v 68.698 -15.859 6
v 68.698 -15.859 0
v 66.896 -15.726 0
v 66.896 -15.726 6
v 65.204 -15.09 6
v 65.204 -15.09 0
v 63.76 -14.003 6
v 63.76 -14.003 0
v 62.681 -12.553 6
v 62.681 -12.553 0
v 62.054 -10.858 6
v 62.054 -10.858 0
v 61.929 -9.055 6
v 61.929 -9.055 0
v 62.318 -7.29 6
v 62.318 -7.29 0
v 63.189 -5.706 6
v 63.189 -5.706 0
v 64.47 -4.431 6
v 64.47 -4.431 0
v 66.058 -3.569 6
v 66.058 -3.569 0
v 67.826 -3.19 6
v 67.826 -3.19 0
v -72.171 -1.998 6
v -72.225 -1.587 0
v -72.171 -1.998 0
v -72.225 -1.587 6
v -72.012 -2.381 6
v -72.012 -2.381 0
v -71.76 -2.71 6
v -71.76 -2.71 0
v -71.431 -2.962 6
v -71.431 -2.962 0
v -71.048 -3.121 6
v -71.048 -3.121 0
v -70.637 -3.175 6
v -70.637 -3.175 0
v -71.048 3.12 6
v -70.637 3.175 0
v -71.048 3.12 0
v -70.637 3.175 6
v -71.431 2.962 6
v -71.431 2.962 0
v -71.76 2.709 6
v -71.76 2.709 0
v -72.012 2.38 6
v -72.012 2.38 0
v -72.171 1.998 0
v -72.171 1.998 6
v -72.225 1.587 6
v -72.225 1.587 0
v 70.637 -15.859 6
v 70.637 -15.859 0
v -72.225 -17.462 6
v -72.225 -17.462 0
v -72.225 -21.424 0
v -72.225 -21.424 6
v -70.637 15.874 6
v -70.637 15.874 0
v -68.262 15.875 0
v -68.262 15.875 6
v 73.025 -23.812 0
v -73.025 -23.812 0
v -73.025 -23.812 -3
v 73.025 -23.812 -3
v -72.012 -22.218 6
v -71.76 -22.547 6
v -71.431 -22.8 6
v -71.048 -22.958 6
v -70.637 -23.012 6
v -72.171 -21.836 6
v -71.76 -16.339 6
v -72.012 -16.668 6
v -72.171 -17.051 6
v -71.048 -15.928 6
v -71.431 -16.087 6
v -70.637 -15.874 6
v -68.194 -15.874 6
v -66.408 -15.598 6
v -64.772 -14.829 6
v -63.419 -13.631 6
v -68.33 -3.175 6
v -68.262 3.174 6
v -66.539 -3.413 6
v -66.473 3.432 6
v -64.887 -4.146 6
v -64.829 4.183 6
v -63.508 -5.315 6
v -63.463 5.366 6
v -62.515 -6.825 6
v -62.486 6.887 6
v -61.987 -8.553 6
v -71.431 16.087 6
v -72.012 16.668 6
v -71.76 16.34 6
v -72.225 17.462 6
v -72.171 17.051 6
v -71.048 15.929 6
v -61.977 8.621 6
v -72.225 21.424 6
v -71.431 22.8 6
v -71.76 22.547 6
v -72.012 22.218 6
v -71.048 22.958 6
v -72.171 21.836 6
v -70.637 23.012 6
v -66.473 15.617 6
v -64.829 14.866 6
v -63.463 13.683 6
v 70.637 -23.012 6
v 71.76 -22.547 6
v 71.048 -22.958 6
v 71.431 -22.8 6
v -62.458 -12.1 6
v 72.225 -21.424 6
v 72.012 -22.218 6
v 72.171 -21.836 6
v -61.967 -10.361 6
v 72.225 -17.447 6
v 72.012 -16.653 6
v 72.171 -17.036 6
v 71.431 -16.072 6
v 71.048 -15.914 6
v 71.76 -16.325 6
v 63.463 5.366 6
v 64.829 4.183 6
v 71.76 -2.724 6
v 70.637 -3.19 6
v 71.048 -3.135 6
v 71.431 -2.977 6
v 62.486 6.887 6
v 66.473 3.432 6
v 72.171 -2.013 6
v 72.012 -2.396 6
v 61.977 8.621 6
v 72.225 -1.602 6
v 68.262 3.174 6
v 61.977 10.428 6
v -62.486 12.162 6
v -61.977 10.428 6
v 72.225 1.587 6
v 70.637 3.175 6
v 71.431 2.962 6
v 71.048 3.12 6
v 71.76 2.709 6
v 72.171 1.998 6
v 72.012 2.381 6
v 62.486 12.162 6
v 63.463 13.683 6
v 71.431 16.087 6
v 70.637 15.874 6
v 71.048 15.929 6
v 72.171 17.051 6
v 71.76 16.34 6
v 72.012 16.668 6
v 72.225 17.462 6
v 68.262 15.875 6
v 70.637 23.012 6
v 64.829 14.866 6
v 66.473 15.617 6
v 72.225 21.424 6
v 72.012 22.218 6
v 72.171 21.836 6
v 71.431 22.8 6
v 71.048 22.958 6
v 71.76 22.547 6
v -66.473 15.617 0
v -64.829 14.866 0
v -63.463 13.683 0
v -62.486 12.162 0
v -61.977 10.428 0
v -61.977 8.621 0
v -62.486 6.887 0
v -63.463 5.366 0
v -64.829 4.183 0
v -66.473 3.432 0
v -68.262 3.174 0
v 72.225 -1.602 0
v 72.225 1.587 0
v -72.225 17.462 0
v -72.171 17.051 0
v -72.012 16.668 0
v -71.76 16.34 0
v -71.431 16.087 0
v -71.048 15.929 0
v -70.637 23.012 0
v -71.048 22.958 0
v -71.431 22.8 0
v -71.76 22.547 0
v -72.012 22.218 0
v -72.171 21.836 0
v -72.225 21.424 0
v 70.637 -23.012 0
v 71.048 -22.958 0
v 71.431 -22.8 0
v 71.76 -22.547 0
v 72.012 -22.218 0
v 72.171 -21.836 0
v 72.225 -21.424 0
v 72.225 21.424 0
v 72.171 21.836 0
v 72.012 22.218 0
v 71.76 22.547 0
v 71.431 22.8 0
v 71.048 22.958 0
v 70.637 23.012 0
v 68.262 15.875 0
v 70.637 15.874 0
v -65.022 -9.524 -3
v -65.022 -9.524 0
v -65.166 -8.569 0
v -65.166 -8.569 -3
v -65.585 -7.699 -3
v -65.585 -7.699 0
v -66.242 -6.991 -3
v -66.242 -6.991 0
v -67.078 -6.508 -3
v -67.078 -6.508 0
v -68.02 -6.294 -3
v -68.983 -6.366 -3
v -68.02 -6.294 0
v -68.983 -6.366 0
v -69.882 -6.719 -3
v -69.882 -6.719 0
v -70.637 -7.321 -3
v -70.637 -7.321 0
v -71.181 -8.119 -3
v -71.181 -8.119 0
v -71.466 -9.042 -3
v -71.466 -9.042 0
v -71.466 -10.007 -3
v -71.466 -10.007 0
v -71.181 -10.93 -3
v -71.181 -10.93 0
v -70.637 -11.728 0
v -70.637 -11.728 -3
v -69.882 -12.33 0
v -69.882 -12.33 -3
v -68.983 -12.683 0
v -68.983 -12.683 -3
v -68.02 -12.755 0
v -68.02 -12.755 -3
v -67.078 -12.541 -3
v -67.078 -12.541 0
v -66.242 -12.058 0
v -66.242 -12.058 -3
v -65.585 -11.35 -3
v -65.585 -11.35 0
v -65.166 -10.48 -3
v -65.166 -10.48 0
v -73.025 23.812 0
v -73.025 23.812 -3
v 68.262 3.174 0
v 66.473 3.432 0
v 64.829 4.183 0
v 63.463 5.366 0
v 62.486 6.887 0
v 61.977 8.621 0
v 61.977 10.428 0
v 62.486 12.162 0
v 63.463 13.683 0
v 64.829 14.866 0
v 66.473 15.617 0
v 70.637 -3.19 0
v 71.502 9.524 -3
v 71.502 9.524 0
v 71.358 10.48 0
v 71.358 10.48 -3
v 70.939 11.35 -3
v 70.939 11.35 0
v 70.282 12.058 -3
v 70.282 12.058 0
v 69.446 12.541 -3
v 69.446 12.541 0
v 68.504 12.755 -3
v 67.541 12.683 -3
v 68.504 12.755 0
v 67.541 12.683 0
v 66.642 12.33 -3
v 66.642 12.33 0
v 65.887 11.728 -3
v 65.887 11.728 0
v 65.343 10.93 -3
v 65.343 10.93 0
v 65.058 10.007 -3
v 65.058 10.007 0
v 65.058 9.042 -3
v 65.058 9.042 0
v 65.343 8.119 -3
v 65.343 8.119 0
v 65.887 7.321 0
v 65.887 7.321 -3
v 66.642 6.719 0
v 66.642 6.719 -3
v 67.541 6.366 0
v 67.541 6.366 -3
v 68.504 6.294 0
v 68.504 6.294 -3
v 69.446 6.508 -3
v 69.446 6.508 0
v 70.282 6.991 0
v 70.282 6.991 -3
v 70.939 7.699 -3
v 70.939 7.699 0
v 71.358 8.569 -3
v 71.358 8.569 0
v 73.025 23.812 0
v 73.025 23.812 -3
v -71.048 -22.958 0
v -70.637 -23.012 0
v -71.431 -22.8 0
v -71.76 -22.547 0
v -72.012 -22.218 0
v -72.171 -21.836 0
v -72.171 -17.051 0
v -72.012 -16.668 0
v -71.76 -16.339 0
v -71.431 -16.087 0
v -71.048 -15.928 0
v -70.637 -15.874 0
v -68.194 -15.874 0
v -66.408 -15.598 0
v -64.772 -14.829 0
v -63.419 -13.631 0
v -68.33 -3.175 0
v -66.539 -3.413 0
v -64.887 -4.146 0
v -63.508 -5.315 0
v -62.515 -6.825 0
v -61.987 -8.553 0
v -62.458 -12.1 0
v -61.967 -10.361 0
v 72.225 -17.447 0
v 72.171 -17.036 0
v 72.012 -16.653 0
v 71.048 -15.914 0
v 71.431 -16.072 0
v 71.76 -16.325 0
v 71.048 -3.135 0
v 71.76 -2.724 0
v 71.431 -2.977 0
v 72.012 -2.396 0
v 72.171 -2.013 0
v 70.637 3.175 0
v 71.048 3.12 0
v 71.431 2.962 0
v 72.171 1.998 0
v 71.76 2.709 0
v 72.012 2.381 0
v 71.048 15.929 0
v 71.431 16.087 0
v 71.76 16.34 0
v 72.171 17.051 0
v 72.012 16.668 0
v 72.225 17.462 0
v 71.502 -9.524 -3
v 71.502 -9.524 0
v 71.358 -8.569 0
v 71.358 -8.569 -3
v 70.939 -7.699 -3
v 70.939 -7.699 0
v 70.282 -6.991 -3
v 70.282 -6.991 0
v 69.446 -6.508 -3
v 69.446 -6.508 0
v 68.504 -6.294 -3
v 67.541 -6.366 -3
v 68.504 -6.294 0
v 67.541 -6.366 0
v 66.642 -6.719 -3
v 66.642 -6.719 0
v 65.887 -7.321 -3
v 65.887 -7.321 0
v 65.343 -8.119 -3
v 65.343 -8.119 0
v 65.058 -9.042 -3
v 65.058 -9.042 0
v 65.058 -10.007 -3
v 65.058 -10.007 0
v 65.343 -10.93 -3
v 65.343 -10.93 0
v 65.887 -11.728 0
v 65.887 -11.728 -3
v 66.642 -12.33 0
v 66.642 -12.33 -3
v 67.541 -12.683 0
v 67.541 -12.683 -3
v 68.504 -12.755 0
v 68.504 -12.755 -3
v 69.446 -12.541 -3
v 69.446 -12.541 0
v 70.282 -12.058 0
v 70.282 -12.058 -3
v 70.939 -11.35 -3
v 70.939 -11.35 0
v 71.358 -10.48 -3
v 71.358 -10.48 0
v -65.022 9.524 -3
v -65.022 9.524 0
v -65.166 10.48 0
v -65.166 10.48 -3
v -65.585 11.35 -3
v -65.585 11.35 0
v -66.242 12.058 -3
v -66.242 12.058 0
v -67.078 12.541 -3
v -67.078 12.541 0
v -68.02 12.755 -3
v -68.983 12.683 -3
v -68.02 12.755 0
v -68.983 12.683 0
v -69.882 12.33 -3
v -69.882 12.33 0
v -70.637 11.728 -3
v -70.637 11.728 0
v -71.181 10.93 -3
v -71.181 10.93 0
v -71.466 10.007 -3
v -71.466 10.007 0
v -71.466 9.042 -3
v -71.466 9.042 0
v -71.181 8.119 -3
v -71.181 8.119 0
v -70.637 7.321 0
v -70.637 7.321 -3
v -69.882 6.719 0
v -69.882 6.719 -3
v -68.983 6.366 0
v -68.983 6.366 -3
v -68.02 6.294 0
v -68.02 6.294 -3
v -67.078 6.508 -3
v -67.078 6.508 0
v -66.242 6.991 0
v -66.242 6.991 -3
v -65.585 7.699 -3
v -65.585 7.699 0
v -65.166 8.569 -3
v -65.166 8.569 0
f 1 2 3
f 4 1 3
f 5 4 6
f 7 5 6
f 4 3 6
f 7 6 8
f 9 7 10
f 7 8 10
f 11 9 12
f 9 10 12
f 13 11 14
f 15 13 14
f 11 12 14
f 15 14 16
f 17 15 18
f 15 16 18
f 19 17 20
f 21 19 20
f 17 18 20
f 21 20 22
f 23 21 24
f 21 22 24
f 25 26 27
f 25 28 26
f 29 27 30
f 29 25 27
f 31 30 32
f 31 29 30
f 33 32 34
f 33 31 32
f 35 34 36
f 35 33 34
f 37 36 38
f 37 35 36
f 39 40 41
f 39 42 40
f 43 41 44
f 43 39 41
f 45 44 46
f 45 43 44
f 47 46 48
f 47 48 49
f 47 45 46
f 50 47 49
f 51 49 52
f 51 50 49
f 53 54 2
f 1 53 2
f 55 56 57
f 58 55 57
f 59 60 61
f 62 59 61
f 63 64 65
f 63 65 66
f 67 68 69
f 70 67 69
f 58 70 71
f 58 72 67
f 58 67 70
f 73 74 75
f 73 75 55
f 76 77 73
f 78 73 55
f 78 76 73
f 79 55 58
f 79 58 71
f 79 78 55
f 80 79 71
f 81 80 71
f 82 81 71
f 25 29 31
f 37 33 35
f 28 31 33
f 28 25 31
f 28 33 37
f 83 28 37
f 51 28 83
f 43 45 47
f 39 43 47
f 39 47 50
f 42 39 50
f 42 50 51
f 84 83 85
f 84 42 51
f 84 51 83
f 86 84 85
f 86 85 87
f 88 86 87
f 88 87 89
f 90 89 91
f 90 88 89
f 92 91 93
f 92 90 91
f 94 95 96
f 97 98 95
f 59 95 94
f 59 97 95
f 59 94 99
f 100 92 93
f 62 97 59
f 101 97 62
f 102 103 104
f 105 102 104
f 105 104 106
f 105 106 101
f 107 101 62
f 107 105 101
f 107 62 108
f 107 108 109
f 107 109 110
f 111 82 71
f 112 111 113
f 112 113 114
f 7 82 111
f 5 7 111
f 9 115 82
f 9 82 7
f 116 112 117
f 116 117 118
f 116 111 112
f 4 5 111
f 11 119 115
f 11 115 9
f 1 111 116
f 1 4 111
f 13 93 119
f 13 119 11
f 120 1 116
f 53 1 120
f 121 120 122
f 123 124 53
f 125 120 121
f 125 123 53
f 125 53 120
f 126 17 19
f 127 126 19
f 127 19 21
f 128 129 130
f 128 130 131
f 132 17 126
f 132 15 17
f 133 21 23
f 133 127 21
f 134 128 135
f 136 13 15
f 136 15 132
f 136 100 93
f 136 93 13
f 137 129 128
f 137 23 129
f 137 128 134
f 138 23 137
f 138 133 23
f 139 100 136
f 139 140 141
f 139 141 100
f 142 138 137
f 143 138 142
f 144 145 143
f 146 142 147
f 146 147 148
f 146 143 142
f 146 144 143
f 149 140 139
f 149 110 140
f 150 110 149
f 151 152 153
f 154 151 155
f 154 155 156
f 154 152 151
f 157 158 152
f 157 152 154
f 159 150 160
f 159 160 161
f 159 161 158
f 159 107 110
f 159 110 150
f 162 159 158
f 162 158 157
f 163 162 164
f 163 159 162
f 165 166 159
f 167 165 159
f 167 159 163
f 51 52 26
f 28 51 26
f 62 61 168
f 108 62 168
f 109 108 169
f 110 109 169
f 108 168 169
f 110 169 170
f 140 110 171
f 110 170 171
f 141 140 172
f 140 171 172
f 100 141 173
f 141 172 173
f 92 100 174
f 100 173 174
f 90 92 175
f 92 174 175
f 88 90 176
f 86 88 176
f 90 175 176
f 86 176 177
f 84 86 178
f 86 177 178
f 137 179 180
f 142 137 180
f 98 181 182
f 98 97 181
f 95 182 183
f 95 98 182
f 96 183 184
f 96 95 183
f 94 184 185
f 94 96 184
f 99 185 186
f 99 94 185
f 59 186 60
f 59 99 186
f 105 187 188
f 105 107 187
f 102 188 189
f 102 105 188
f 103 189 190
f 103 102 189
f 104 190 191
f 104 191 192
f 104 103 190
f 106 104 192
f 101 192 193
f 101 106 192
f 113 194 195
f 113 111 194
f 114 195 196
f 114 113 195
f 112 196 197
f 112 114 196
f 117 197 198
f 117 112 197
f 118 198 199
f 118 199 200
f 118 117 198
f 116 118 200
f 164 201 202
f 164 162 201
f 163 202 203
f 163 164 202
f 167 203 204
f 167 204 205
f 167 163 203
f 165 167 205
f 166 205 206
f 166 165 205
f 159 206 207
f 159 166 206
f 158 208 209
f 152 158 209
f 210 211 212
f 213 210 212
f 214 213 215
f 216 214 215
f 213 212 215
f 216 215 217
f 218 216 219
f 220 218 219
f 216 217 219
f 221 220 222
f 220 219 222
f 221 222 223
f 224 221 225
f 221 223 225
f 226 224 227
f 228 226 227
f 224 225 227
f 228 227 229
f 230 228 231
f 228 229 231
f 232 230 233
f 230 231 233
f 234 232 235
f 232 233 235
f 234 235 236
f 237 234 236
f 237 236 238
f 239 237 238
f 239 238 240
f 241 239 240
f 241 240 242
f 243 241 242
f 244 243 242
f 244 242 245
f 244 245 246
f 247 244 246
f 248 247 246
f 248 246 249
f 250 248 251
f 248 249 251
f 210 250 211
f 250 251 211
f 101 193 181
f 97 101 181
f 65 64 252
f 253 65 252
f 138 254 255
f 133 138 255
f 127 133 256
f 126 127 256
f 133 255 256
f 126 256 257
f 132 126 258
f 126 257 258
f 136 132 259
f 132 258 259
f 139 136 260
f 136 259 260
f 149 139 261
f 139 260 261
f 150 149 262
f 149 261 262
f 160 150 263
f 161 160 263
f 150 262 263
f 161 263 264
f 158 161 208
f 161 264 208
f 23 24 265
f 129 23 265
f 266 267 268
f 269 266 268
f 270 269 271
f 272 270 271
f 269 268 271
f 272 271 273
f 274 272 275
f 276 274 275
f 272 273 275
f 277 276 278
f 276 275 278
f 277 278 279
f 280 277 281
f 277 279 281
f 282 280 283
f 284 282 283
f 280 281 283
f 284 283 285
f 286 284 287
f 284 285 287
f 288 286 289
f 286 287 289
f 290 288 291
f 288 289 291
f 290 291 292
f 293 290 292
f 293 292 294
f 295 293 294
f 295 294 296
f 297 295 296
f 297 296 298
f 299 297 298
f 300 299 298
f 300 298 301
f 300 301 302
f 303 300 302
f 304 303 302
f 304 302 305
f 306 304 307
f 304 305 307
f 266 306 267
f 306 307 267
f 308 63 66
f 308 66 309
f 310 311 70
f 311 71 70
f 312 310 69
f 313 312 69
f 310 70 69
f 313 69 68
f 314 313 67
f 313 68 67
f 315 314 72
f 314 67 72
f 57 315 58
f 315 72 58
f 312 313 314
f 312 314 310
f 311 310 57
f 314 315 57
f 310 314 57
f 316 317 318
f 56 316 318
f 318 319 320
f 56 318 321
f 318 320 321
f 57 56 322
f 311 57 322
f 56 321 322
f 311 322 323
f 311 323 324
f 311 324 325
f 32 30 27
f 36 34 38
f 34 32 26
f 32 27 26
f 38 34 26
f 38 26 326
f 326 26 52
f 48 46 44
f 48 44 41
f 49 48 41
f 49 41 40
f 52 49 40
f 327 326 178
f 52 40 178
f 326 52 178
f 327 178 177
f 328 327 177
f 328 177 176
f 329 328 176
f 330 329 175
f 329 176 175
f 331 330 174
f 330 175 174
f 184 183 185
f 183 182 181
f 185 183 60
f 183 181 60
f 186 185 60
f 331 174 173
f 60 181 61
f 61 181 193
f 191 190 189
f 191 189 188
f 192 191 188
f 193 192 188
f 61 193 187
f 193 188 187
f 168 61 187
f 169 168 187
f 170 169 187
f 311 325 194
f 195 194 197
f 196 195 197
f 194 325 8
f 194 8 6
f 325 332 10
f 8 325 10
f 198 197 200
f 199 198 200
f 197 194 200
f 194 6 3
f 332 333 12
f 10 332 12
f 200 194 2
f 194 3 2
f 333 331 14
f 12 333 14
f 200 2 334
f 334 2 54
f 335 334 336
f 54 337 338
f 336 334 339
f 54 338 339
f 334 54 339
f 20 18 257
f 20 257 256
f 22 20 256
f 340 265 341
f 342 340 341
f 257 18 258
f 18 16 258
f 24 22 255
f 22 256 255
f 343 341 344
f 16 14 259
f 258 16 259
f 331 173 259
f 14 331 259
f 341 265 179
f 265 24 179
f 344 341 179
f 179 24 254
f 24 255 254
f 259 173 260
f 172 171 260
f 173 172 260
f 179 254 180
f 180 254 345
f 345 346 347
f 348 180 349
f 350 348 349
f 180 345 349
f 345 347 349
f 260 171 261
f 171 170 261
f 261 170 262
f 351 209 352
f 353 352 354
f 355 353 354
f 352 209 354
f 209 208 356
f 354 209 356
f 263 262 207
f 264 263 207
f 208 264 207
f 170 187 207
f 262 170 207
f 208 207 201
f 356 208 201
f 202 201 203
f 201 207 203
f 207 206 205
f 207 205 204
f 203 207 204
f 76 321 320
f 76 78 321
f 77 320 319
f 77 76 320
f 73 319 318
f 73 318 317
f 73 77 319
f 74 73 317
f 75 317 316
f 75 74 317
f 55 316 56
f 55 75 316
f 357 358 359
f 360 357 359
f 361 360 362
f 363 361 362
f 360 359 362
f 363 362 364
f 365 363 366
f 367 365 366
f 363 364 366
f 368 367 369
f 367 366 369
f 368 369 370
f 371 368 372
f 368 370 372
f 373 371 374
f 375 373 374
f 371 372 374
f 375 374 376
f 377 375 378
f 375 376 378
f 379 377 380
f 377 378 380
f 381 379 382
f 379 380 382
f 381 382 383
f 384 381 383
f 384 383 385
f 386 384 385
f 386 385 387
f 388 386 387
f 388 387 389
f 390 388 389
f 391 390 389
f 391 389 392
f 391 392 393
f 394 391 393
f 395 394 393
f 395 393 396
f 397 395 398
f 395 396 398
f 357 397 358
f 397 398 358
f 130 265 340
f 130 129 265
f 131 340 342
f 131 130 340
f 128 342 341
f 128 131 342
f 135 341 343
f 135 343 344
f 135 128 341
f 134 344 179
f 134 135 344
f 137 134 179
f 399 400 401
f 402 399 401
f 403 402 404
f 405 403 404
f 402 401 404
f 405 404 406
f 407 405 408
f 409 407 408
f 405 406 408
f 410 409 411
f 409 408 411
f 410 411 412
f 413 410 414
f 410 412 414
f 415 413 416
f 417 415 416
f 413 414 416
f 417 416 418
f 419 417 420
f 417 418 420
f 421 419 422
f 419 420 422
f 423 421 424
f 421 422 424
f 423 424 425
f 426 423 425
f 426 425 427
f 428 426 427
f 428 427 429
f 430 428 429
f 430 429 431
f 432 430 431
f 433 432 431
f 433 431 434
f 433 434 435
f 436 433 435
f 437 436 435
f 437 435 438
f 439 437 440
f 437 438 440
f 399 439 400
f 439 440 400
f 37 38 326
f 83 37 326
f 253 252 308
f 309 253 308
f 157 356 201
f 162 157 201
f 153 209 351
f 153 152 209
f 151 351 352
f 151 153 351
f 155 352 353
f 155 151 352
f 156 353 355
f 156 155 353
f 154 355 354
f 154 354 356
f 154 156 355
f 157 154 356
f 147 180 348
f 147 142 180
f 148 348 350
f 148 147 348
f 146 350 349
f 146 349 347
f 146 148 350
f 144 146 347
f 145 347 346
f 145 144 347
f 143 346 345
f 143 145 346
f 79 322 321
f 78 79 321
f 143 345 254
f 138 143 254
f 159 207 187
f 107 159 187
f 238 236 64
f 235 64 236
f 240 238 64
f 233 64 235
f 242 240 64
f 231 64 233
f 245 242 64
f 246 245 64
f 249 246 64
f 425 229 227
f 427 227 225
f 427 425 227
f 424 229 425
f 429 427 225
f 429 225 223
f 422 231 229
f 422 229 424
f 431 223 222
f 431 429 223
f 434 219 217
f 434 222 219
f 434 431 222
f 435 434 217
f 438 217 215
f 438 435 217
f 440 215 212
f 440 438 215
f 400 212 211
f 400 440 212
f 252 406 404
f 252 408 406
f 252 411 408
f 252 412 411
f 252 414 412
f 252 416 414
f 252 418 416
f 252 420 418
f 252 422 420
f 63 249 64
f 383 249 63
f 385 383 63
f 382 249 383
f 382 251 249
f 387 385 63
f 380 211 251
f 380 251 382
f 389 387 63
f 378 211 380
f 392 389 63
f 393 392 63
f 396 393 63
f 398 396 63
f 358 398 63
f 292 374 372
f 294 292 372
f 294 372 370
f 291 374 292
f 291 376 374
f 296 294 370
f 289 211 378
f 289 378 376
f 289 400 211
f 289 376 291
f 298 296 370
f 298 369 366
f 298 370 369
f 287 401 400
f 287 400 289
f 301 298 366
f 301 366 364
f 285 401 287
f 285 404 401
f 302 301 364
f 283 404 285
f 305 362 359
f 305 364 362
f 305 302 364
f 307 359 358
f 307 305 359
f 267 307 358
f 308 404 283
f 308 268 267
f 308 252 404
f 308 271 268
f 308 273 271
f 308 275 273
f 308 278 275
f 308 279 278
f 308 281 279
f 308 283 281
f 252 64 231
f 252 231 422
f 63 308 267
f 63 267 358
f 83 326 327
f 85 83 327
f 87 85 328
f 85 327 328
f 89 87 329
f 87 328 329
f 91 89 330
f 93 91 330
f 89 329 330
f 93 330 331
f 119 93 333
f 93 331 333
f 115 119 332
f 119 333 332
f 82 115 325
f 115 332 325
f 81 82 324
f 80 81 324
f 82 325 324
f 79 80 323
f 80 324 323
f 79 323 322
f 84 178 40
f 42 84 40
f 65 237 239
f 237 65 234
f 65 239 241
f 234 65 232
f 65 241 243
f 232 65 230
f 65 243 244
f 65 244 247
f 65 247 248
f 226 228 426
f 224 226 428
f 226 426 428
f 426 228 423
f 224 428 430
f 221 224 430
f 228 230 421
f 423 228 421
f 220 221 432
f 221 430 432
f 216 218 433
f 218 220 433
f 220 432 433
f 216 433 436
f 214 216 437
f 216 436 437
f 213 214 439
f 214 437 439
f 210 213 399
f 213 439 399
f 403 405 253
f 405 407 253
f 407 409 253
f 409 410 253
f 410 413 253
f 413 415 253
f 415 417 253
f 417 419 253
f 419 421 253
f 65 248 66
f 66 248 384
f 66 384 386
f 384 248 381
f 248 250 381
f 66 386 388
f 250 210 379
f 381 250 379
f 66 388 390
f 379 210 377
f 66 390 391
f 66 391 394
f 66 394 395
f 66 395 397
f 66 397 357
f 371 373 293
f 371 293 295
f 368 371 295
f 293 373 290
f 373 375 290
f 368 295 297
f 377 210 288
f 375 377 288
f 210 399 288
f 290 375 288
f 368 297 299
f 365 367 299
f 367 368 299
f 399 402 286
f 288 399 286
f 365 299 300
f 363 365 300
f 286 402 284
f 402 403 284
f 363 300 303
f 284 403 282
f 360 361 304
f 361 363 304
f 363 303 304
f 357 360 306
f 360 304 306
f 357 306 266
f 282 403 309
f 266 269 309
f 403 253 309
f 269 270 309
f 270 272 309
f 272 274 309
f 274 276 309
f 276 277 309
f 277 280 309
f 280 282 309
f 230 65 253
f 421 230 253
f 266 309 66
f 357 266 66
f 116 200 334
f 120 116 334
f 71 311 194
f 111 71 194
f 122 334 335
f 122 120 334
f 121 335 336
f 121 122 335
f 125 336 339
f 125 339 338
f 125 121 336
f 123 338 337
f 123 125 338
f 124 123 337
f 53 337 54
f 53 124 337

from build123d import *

# Parameters (mm, degrees)
F0_W     = 146.05
F0_H     = 47.625
F0_R     = 3.24
F1_DEPTH = 3
F2_DEPTH = 6
F3_R     = 1.588


# Not quite as in the source:
# - ends of sketch curves that miss each other by under 0.0002 mm in the source are joined


with BuildPart() as f1:
    # F0 (on Top) → F1 (new body)
    with BuildSketch(Plane.XY):
        Rectangle(F0_W, F0_H)
        with Locations((-68.262, -9.5245)):
            Circle(F0_R, mode=Mode.SUBTRACT)
        with Locations((68.262, -9.5245)):
            Circle(F0_R, mode=Mode.SUBTRACT)
        with Locations((-68.262, 9.5245)):
            Circle(F0_R, mode=Mode.SUBTRACT)
        with BuildLine():
            Line((72.225, -15.859485), (72.225, -23.0125))
            Line((72.225, -23.0125), (-72.225, -23.0125))
            Line((-72.225, -23.0125), (-72.225, -15.874133))
            Line((-72.225, -15.874133), (-68.193705, -15.874133))
            ThreePointArc((-68.193705, -15.874133), (-61.912367271, -9.4562050029), (-68.3302949971, -3.174867271))
            Line((-68.3302949971, -3.174867271), (-72.225, -3.174867))
            Line((-72.225, -3.174867), (-72.225, 3.1745))
            Line((-72.225, 3.1745), (-68.262, 3.1745))
            ThreePointArc((-68.262, 3.1745), (-61.912, 9.5245), (-68.262, 15.8745))
            Line((-68.262, 15.8745), (-72.225, 15.8745))
            Line((-72.225, 15.8745), (-72.225, 23.0125))
            Line((-72.225, 23.0125), (72.225, 23.0125))
            Line((72.225, 23.0125), (72.225, 15.8745))
            Line((72.225, 15.8745), (68.262, 15.8745))
            ThreePointArc((68.262, 15.8745), (61.912, 9.5245), (68.262, 3.1745))
            Line((68.262, 3.1745), (72.225, 3.1745))
            Line((72.225, 3.1745), (72.225, -3.189515))
            Line((72.225, -3.189515), (67.825573, -3.189515))
            ThreePointArc((67.825573, -3.189515), (61.9270152731, -9.9609269812), (68.6984269812, -15.8594847269))
            Line((68.6984269812, -15.8594847269), (72.225, -15.859485))
        make_face(mode=Mode.SUBTRACT)
        with Locations((68.262, 9.5245)):
            Circle(F0_R, mode=Mode.SUBTRACT)
        with BuildLine():
            Line((-72.225, -23.0125), (72.225, -23.0125))
            Line((72.225, -23.0125), (72.225, -15.859485))
            Line((72.225, -15.859485), (68.698427, -15.859485))
            ThreePointArc((68.698427, -15.859485), (61.9270152731, -9.9609269812), (67.8255730188, -3.1895152731))
            Line((67.8255730188, -3.1895152731), (72.225, -3.189515))
            Line((72.225, -3.189515), (72.225, 3.1745))
            Line((72.225, 3.1745), (68.262, 3.1745))
            ThreePointArc((68.262, 3.1745), (61.912, 9.5245), (68.262, 15.8745))
            Line((68.262, 15.8745), (72.225, 15.8745))
            Line((72.225, 15.8745), (72.225, 23.0125))
            Line((72.225, 23.0125), (-72.225, 23.0125))
            Line((-72.225, 23.0125), (-72.225, 15.8745))
            Line((-72.225, 15.8745), (-68.262, 15.8745))
            ThreePointArc((-68.262, 15.8745), (-61.912, 9.5245), (-68.262, 3.1745))
            Line((-68.262, 3.1745), (-72.225, 3.1745))
            Line((-72.225, 3.1745), (-72.225, -3.174867))
            Line((-72.225, -3.174867), (-68.330295, -3.174867))
            ThreePointArc((-68.330295, -3.174867), (-61.912367271, -9.4562050029), (-68.1937050029, -15.874132729))
            Line((-68.1937050029, -15.874132729), (-72.225, -15.874133))
            Line((-72.225, -15.874133), (-72.225, -23.0125))
        make_face()
    extrude(amount=-F1_DEPTH)


with BuildPart() as f2:
    # F0 (on Top) → F2 (new body)
    with BuildSketch(Plane.XY):
        with BuildLine():
            Line((-72.225, -23.0125), (72.225, -23.0125))
            Line((72.225, -23.0125), (72.225, -15.859485))
            Line((72.225, -15.859485), (68.698427, -15.859485))
            ThreePointArc((68.698427, -15.859485), (61.9270152731, -9.9609269812), (67.8255730188, -3.1895152731))
            Line((67.8255730188, -3.1895152731), (72.225, -3.189515))
            Line((72.225, -3.189515), (72.225, 3.1745))
            Line((72.225, 3.1745), (68.262, 3.1745))
            ThreePointArc((68.262, 3.1745), (61.912, 9.5245), (68.262, 15.8745))
            Line((68.262, 15.8745), (72.225, 15.8745))
            Line((72.225, 15.8745), (72.225, 23.0125))
            Line((72.225, 23.0125), (-72.225, 23.0125))
            Line((-72.225, 23.0125), (-72.225, 15.8745))
            Line((-72.225, 15.8745), (-68.262, 15.8745))
            ThreePointArc((-68.262, 15.8745), (-61.912, 9.5245), (-68.262, 3.1745))
            Line((-68.262, 3.1745), (-72.225, 3.1745))
            Line((-72.225, 3.1745), (-72.225, -3.174867))
            Line((-72.225, -3.174867), (-68.330295, -3.174867))
            ThreePointArc((-68.330295, -3.174867), (-61.912367271, -9.4562050029), (-68.1937050029, -15.874132729))
            Line((-68.1937050029, -15.874132729), (-72.225, -15.874133))
            Line((-72.225, -15.874133), (-72.225, -23.0125))
        make_face()
    extrude(amount=F2_DEPTH)

    # F3
    f3_edges = [f2.edges().sort_by_distance(p)[0] for p in [
        (-72.225, 23.0125, 3),
        (-72.225, 15.8745, 3),
        (-72.225, 3.1745, 3),
        (-72.225, -3.174867, 3),
        (-72.225, -15.874133, 3),
        (-72.225, -23.0125, 3),
        (72.225, -23.0125, 3),
        (72.225, -15.859485, 3),
        (72.225, -3.189515, 3),
        (72.225, 3.1745, 3),
        (72.225, 23.0125, 3),
        (72.225, 15.8745, 3),
    ]]
    fillet(f3_edges, radius=F3_R)


solid = Compound([f1.part, f2.part])
